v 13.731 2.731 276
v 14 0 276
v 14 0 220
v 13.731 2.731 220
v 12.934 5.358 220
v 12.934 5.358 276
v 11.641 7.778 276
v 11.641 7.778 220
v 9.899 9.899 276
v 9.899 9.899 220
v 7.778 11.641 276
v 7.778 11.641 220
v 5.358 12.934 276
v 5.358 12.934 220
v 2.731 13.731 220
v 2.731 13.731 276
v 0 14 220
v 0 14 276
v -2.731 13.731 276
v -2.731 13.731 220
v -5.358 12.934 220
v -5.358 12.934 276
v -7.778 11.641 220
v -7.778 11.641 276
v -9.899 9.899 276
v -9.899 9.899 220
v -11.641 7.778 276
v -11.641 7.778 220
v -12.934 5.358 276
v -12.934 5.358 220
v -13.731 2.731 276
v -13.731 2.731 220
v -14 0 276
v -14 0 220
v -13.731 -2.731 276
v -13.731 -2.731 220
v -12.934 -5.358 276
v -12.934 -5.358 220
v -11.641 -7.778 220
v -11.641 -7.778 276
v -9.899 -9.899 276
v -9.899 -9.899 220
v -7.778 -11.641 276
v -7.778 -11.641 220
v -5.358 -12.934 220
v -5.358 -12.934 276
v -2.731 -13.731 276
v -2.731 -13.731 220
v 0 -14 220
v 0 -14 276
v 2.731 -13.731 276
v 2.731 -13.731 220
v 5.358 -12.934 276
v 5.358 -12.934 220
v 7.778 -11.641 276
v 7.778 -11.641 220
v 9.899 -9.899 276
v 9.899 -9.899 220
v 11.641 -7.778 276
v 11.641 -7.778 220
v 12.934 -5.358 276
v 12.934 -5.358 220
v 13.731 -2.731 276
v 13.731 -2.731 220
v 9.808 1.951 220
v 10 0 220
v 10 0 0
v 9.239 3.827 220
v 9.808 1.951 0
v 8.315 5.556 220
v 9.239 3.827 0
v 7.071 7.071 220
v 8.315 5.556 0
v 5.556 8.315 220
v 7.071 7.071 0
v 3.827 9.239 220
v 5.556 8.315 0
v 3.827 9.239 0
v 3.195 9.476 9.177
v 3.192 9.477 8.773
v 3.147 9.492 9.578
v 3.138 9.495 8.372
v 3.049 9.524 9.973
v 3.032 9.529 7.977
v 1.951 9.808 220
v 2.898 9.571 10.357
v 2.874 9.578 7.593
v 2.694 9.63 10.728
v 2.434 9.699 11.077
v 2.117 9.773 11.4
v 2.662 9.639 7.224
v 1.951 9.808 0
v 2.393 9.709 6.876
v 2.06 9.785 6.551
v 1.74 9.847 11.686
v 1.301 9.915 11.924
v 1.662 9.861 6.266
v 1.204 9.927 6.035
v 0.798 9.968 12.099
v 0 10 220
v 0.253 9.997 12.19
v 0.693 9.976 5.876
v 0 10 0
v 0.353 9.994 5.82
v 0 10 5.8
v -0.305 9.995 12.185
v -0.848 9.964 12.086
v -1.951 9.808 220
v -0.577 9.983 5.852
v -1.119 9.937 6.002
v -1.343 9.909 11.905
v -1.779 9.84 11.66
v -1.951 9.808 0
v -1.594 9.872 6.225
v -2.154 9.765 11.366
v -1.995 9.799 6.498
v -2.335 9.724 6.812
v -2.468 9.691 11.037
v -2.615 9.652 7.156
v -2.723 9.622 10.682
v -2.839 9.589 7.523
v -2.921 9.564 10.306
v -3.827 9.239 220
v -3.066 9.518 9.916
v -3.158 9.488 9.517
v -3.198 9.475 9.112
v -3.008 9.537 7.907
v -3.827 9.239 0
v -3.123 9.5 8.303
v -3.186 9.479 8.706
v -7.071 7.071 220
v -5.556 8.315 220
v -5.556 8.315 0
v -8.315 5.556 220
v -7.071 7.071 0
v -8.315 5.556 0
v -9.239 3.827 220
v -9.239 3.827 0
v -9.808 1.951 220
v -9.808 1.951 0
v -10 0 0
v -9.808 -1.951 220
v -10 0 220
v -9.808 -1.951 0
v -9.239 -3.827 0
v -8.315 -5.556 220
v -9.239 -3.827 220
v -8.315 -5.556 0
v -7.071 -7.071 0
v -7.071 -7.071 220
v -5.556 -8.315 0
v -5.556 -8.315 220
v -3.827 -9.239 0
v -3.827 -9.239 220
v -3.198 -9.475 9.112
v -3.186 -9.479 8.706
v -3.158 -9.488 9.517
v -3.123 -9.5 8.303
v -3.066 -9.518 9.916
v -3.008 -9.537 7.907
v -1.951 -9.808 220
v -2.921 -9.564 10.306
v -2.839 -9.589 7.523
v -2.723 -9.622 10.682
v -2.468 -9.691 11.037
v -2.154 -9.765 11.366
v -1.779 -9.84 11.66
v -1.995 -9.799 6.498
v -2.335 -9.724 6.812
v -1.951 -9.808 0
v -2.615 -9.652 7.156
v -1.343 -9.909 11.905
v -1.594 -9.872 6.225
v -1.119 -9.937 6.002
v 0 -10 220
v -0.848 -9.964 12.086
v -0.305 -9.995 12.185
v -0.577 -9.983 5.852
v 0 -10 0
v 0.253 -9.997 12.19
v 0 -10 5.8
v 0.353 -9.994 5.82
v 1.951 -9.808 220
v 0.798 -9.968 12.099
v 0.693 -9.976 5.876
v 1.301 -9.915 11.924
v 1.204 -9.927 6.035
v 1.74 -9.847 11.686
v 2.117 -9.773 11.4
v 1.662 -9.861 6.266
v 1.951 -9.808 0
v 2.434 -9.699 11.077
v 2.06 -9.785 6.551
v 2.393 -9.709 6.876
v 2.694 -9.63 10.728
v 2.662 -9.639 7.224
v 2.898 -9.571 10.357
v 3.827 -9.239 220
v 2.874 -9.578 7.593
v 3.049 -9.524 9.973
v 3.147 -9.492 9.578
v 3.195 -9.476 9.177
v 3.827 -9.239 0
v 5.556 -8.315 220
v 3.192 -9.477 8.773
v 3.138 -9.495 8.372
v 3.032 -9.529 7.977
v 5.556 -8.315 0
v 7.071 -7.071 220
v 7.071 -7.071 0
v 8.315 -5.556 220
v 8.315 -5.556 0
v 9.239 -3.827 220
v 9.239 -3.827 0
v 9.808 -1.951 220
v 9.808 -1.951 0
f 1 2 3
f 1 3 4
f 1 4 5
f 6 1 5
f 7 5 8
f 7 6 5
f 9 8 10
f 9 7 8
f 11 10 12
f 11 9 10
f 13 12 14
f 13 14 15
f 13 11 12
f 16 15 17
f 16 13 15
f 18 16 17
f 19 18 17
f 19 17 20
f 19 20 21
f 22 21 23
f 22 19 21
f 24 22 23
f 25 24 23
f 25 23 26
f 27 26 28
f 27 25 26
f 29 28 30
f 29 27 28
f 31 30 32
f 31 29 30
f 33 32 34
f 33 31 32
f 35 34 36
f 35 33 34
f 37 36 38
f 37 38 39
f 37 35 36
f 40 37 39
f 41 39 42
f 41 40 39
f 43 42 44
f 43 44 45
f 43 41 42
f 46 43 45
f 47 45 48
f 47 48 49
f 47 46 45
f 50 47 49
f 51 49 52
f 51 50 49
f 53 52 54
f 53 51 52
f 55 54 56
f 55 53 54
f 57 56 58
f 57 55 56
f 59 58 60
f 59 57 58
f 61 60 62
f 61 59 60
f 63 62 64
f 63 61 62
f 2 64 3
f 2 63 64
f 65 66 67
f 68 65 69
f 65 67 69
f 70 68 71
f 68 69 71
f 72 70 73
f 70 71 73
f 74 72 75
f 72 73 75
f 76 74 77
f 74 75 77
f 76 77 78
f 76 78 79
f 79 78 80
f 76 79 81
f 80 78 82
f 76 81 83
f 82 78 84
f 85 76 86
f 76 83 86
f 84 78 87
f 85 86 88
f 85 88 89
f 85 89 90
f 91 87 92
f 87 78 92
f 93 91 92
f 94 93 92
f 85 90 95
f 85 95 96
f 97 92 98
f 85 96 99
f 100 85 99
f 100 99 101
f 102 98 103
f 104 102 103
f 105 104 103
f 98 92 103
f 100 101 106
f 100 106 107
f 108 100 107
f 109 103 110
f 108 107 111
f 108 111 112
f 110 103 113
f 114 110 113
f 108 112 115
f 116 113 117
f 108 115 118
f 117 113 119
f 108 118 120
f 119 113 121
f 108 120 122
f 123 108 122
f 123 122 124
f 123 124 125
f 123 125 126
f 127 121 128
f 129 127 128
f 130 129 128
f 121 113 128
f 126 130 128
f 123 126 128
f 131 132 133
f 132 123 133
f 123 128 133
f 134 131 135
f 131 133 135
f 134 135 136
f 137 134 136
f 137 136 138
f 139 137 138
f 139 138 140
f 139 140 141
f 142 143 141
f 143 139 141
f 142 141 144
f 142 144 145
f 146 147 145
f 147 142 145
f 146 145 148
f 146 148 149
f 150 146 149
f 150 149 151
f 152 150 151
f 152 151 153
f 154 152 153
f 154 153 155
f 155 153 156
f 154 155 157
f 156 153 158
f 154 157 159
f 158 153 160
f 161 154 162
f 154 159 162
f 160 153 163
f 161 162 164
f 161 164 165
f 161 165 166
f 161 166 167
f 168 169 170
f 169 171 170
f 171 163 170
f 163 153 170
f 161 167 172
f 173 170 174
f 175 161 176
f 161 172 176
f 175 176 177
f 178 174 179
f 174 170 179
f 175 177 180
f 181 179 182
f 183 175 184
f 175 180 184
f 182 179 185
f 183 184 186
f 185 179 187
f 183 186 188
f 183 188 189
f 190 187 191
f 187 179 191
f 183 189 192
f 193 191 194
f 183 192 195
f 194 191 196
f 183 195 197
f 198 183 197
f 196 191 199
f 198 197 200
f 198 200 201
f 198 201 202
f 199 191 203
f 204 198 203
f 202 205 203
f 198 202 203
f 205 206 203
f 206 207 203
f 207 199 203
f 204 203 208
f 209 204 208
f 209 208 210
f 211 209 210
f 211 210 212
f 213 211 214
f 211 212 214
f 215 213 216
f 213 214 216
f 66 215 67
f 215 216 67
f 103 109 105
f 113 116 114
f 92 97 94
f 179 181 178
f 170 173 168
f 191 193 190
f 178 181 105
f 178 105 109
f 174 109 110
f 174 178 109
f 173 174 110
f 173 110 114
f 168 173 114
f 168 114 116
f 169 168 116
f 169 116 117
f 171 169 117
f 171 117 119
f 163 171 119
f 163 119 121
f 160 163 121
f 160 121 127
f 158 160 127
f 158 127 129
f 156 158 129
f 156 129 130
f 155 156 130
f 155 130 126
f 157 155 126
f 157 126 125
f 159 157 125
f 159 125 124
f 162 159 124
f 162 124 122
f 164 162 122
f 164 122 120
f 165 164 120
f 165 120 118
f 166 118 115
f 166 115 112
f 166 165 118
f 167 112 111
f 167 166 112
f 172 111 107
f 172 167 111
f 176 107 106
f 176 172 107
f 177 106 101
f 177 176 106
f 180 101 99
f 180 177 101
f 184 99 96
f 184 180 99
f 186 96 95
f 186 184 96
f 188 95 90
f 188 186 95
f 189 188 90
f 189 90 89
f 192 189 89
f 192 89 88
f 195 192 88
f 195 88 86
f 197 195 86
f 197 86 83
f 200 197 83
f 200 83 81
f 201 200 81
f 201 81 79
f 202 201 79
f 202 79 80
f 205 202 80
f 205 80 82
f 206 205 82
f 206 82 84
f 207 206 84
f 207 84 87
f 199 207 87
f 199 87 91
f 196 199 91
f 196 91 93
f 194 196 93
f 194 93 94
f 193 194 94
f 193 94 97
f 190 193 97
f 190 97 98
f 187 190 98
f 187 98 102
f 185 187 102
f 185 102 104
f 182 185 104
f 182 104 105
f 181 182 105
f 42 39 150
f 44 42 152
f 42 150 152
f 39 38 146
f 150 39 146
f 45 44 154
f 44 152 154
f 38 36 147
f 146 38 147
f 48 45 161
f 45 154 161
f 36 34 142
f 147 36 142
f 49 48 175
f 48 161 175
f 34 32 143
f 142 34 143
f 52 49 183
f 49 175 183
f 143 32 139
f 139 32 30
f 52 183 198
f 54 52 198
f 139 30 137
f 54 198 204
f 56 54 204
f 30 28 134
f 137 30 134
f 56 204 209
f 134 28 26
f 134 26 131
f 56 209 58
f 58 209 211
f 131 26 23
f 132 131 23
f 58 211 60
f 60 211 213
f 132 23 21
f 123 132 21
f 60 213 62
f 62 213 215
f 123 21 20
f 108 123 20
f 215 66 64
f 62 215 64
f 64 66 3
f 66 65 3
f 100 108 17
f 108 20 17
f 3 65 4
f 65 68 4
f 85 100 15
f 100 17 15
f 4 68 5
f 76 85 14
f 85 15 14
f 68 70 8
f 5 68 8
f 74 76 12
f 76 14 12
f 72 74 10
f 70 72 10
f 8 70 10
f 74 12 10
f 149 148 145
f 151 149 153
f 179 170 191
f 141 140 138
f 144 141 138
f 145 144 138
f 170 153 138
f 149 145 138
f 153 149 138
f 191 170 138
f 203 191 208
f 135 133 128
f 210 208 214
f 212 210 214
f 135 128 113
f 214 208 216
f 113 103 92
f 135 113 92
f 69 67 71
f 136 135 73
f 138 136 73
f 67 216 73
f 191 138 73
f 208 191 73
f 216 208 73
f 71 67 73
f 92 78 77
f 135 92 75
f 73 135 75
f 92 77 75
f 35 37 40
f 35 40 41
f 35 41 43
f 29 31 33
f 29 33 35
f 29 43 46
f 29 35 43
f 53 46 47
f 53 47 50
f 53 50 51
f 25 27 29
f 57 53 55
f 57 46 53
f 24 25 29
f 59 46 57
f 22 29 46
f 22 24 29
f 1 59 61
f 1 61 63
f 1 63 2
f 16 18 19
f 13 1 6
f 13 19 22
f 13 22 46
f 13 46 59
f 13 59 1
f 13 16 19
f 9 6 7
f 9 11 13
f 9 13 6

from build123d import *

# Parameters (mm, degrees)
SKETCH1_R               = 10
BOSS_EXTRUDE1_DEPTH     = 276
SKETCH2_R               = 14
BOSS_EXTRUDE2_DEPTH     = 56
CUT_EXTRUDE1_DEPTH      = 56
CUT_EXTRUDE1_DEPTH_BACK = 56
SKETCH3_R               = 3.2


with BuildPart() as part:
    # Sketch1 → Boss-Extrude1 (new body)
    with BuildSketch(Plane.XY):
        Circle(SKETCH1_R)
    extrude(amount=BOSS_EXTRUDE1_DEPTH)

    # Sketch2 → Boss-Extrude2 (add)
    with BuildSketch(Plane.XY.offset(276)):
        Circle(SKETCH2_R)
    extrude(amount=-BOSS_EXTRUDE2_DEPTH)

    # Sketch3 → Cut-Extrude1 (cut, two sides: drawn at the far end of the back side and taken through both)
    with BuildSketch(Plane(origin=(0, 0, 0), x_dir=(1, 0, 0), z_dir=(0, 1, 0)).offset(-CUT_EXTRUDE1_DEPTH_BACK)):
        with Locations((0, -9)):
            Circle(SKETCH3_R)
    extrude(amount=CUT_EXTRUDE1_DEPTH + CUT_EXTRUDE1_DEPTH_BACK, mode=Mode.SUBTRACT)


solid = part.part
